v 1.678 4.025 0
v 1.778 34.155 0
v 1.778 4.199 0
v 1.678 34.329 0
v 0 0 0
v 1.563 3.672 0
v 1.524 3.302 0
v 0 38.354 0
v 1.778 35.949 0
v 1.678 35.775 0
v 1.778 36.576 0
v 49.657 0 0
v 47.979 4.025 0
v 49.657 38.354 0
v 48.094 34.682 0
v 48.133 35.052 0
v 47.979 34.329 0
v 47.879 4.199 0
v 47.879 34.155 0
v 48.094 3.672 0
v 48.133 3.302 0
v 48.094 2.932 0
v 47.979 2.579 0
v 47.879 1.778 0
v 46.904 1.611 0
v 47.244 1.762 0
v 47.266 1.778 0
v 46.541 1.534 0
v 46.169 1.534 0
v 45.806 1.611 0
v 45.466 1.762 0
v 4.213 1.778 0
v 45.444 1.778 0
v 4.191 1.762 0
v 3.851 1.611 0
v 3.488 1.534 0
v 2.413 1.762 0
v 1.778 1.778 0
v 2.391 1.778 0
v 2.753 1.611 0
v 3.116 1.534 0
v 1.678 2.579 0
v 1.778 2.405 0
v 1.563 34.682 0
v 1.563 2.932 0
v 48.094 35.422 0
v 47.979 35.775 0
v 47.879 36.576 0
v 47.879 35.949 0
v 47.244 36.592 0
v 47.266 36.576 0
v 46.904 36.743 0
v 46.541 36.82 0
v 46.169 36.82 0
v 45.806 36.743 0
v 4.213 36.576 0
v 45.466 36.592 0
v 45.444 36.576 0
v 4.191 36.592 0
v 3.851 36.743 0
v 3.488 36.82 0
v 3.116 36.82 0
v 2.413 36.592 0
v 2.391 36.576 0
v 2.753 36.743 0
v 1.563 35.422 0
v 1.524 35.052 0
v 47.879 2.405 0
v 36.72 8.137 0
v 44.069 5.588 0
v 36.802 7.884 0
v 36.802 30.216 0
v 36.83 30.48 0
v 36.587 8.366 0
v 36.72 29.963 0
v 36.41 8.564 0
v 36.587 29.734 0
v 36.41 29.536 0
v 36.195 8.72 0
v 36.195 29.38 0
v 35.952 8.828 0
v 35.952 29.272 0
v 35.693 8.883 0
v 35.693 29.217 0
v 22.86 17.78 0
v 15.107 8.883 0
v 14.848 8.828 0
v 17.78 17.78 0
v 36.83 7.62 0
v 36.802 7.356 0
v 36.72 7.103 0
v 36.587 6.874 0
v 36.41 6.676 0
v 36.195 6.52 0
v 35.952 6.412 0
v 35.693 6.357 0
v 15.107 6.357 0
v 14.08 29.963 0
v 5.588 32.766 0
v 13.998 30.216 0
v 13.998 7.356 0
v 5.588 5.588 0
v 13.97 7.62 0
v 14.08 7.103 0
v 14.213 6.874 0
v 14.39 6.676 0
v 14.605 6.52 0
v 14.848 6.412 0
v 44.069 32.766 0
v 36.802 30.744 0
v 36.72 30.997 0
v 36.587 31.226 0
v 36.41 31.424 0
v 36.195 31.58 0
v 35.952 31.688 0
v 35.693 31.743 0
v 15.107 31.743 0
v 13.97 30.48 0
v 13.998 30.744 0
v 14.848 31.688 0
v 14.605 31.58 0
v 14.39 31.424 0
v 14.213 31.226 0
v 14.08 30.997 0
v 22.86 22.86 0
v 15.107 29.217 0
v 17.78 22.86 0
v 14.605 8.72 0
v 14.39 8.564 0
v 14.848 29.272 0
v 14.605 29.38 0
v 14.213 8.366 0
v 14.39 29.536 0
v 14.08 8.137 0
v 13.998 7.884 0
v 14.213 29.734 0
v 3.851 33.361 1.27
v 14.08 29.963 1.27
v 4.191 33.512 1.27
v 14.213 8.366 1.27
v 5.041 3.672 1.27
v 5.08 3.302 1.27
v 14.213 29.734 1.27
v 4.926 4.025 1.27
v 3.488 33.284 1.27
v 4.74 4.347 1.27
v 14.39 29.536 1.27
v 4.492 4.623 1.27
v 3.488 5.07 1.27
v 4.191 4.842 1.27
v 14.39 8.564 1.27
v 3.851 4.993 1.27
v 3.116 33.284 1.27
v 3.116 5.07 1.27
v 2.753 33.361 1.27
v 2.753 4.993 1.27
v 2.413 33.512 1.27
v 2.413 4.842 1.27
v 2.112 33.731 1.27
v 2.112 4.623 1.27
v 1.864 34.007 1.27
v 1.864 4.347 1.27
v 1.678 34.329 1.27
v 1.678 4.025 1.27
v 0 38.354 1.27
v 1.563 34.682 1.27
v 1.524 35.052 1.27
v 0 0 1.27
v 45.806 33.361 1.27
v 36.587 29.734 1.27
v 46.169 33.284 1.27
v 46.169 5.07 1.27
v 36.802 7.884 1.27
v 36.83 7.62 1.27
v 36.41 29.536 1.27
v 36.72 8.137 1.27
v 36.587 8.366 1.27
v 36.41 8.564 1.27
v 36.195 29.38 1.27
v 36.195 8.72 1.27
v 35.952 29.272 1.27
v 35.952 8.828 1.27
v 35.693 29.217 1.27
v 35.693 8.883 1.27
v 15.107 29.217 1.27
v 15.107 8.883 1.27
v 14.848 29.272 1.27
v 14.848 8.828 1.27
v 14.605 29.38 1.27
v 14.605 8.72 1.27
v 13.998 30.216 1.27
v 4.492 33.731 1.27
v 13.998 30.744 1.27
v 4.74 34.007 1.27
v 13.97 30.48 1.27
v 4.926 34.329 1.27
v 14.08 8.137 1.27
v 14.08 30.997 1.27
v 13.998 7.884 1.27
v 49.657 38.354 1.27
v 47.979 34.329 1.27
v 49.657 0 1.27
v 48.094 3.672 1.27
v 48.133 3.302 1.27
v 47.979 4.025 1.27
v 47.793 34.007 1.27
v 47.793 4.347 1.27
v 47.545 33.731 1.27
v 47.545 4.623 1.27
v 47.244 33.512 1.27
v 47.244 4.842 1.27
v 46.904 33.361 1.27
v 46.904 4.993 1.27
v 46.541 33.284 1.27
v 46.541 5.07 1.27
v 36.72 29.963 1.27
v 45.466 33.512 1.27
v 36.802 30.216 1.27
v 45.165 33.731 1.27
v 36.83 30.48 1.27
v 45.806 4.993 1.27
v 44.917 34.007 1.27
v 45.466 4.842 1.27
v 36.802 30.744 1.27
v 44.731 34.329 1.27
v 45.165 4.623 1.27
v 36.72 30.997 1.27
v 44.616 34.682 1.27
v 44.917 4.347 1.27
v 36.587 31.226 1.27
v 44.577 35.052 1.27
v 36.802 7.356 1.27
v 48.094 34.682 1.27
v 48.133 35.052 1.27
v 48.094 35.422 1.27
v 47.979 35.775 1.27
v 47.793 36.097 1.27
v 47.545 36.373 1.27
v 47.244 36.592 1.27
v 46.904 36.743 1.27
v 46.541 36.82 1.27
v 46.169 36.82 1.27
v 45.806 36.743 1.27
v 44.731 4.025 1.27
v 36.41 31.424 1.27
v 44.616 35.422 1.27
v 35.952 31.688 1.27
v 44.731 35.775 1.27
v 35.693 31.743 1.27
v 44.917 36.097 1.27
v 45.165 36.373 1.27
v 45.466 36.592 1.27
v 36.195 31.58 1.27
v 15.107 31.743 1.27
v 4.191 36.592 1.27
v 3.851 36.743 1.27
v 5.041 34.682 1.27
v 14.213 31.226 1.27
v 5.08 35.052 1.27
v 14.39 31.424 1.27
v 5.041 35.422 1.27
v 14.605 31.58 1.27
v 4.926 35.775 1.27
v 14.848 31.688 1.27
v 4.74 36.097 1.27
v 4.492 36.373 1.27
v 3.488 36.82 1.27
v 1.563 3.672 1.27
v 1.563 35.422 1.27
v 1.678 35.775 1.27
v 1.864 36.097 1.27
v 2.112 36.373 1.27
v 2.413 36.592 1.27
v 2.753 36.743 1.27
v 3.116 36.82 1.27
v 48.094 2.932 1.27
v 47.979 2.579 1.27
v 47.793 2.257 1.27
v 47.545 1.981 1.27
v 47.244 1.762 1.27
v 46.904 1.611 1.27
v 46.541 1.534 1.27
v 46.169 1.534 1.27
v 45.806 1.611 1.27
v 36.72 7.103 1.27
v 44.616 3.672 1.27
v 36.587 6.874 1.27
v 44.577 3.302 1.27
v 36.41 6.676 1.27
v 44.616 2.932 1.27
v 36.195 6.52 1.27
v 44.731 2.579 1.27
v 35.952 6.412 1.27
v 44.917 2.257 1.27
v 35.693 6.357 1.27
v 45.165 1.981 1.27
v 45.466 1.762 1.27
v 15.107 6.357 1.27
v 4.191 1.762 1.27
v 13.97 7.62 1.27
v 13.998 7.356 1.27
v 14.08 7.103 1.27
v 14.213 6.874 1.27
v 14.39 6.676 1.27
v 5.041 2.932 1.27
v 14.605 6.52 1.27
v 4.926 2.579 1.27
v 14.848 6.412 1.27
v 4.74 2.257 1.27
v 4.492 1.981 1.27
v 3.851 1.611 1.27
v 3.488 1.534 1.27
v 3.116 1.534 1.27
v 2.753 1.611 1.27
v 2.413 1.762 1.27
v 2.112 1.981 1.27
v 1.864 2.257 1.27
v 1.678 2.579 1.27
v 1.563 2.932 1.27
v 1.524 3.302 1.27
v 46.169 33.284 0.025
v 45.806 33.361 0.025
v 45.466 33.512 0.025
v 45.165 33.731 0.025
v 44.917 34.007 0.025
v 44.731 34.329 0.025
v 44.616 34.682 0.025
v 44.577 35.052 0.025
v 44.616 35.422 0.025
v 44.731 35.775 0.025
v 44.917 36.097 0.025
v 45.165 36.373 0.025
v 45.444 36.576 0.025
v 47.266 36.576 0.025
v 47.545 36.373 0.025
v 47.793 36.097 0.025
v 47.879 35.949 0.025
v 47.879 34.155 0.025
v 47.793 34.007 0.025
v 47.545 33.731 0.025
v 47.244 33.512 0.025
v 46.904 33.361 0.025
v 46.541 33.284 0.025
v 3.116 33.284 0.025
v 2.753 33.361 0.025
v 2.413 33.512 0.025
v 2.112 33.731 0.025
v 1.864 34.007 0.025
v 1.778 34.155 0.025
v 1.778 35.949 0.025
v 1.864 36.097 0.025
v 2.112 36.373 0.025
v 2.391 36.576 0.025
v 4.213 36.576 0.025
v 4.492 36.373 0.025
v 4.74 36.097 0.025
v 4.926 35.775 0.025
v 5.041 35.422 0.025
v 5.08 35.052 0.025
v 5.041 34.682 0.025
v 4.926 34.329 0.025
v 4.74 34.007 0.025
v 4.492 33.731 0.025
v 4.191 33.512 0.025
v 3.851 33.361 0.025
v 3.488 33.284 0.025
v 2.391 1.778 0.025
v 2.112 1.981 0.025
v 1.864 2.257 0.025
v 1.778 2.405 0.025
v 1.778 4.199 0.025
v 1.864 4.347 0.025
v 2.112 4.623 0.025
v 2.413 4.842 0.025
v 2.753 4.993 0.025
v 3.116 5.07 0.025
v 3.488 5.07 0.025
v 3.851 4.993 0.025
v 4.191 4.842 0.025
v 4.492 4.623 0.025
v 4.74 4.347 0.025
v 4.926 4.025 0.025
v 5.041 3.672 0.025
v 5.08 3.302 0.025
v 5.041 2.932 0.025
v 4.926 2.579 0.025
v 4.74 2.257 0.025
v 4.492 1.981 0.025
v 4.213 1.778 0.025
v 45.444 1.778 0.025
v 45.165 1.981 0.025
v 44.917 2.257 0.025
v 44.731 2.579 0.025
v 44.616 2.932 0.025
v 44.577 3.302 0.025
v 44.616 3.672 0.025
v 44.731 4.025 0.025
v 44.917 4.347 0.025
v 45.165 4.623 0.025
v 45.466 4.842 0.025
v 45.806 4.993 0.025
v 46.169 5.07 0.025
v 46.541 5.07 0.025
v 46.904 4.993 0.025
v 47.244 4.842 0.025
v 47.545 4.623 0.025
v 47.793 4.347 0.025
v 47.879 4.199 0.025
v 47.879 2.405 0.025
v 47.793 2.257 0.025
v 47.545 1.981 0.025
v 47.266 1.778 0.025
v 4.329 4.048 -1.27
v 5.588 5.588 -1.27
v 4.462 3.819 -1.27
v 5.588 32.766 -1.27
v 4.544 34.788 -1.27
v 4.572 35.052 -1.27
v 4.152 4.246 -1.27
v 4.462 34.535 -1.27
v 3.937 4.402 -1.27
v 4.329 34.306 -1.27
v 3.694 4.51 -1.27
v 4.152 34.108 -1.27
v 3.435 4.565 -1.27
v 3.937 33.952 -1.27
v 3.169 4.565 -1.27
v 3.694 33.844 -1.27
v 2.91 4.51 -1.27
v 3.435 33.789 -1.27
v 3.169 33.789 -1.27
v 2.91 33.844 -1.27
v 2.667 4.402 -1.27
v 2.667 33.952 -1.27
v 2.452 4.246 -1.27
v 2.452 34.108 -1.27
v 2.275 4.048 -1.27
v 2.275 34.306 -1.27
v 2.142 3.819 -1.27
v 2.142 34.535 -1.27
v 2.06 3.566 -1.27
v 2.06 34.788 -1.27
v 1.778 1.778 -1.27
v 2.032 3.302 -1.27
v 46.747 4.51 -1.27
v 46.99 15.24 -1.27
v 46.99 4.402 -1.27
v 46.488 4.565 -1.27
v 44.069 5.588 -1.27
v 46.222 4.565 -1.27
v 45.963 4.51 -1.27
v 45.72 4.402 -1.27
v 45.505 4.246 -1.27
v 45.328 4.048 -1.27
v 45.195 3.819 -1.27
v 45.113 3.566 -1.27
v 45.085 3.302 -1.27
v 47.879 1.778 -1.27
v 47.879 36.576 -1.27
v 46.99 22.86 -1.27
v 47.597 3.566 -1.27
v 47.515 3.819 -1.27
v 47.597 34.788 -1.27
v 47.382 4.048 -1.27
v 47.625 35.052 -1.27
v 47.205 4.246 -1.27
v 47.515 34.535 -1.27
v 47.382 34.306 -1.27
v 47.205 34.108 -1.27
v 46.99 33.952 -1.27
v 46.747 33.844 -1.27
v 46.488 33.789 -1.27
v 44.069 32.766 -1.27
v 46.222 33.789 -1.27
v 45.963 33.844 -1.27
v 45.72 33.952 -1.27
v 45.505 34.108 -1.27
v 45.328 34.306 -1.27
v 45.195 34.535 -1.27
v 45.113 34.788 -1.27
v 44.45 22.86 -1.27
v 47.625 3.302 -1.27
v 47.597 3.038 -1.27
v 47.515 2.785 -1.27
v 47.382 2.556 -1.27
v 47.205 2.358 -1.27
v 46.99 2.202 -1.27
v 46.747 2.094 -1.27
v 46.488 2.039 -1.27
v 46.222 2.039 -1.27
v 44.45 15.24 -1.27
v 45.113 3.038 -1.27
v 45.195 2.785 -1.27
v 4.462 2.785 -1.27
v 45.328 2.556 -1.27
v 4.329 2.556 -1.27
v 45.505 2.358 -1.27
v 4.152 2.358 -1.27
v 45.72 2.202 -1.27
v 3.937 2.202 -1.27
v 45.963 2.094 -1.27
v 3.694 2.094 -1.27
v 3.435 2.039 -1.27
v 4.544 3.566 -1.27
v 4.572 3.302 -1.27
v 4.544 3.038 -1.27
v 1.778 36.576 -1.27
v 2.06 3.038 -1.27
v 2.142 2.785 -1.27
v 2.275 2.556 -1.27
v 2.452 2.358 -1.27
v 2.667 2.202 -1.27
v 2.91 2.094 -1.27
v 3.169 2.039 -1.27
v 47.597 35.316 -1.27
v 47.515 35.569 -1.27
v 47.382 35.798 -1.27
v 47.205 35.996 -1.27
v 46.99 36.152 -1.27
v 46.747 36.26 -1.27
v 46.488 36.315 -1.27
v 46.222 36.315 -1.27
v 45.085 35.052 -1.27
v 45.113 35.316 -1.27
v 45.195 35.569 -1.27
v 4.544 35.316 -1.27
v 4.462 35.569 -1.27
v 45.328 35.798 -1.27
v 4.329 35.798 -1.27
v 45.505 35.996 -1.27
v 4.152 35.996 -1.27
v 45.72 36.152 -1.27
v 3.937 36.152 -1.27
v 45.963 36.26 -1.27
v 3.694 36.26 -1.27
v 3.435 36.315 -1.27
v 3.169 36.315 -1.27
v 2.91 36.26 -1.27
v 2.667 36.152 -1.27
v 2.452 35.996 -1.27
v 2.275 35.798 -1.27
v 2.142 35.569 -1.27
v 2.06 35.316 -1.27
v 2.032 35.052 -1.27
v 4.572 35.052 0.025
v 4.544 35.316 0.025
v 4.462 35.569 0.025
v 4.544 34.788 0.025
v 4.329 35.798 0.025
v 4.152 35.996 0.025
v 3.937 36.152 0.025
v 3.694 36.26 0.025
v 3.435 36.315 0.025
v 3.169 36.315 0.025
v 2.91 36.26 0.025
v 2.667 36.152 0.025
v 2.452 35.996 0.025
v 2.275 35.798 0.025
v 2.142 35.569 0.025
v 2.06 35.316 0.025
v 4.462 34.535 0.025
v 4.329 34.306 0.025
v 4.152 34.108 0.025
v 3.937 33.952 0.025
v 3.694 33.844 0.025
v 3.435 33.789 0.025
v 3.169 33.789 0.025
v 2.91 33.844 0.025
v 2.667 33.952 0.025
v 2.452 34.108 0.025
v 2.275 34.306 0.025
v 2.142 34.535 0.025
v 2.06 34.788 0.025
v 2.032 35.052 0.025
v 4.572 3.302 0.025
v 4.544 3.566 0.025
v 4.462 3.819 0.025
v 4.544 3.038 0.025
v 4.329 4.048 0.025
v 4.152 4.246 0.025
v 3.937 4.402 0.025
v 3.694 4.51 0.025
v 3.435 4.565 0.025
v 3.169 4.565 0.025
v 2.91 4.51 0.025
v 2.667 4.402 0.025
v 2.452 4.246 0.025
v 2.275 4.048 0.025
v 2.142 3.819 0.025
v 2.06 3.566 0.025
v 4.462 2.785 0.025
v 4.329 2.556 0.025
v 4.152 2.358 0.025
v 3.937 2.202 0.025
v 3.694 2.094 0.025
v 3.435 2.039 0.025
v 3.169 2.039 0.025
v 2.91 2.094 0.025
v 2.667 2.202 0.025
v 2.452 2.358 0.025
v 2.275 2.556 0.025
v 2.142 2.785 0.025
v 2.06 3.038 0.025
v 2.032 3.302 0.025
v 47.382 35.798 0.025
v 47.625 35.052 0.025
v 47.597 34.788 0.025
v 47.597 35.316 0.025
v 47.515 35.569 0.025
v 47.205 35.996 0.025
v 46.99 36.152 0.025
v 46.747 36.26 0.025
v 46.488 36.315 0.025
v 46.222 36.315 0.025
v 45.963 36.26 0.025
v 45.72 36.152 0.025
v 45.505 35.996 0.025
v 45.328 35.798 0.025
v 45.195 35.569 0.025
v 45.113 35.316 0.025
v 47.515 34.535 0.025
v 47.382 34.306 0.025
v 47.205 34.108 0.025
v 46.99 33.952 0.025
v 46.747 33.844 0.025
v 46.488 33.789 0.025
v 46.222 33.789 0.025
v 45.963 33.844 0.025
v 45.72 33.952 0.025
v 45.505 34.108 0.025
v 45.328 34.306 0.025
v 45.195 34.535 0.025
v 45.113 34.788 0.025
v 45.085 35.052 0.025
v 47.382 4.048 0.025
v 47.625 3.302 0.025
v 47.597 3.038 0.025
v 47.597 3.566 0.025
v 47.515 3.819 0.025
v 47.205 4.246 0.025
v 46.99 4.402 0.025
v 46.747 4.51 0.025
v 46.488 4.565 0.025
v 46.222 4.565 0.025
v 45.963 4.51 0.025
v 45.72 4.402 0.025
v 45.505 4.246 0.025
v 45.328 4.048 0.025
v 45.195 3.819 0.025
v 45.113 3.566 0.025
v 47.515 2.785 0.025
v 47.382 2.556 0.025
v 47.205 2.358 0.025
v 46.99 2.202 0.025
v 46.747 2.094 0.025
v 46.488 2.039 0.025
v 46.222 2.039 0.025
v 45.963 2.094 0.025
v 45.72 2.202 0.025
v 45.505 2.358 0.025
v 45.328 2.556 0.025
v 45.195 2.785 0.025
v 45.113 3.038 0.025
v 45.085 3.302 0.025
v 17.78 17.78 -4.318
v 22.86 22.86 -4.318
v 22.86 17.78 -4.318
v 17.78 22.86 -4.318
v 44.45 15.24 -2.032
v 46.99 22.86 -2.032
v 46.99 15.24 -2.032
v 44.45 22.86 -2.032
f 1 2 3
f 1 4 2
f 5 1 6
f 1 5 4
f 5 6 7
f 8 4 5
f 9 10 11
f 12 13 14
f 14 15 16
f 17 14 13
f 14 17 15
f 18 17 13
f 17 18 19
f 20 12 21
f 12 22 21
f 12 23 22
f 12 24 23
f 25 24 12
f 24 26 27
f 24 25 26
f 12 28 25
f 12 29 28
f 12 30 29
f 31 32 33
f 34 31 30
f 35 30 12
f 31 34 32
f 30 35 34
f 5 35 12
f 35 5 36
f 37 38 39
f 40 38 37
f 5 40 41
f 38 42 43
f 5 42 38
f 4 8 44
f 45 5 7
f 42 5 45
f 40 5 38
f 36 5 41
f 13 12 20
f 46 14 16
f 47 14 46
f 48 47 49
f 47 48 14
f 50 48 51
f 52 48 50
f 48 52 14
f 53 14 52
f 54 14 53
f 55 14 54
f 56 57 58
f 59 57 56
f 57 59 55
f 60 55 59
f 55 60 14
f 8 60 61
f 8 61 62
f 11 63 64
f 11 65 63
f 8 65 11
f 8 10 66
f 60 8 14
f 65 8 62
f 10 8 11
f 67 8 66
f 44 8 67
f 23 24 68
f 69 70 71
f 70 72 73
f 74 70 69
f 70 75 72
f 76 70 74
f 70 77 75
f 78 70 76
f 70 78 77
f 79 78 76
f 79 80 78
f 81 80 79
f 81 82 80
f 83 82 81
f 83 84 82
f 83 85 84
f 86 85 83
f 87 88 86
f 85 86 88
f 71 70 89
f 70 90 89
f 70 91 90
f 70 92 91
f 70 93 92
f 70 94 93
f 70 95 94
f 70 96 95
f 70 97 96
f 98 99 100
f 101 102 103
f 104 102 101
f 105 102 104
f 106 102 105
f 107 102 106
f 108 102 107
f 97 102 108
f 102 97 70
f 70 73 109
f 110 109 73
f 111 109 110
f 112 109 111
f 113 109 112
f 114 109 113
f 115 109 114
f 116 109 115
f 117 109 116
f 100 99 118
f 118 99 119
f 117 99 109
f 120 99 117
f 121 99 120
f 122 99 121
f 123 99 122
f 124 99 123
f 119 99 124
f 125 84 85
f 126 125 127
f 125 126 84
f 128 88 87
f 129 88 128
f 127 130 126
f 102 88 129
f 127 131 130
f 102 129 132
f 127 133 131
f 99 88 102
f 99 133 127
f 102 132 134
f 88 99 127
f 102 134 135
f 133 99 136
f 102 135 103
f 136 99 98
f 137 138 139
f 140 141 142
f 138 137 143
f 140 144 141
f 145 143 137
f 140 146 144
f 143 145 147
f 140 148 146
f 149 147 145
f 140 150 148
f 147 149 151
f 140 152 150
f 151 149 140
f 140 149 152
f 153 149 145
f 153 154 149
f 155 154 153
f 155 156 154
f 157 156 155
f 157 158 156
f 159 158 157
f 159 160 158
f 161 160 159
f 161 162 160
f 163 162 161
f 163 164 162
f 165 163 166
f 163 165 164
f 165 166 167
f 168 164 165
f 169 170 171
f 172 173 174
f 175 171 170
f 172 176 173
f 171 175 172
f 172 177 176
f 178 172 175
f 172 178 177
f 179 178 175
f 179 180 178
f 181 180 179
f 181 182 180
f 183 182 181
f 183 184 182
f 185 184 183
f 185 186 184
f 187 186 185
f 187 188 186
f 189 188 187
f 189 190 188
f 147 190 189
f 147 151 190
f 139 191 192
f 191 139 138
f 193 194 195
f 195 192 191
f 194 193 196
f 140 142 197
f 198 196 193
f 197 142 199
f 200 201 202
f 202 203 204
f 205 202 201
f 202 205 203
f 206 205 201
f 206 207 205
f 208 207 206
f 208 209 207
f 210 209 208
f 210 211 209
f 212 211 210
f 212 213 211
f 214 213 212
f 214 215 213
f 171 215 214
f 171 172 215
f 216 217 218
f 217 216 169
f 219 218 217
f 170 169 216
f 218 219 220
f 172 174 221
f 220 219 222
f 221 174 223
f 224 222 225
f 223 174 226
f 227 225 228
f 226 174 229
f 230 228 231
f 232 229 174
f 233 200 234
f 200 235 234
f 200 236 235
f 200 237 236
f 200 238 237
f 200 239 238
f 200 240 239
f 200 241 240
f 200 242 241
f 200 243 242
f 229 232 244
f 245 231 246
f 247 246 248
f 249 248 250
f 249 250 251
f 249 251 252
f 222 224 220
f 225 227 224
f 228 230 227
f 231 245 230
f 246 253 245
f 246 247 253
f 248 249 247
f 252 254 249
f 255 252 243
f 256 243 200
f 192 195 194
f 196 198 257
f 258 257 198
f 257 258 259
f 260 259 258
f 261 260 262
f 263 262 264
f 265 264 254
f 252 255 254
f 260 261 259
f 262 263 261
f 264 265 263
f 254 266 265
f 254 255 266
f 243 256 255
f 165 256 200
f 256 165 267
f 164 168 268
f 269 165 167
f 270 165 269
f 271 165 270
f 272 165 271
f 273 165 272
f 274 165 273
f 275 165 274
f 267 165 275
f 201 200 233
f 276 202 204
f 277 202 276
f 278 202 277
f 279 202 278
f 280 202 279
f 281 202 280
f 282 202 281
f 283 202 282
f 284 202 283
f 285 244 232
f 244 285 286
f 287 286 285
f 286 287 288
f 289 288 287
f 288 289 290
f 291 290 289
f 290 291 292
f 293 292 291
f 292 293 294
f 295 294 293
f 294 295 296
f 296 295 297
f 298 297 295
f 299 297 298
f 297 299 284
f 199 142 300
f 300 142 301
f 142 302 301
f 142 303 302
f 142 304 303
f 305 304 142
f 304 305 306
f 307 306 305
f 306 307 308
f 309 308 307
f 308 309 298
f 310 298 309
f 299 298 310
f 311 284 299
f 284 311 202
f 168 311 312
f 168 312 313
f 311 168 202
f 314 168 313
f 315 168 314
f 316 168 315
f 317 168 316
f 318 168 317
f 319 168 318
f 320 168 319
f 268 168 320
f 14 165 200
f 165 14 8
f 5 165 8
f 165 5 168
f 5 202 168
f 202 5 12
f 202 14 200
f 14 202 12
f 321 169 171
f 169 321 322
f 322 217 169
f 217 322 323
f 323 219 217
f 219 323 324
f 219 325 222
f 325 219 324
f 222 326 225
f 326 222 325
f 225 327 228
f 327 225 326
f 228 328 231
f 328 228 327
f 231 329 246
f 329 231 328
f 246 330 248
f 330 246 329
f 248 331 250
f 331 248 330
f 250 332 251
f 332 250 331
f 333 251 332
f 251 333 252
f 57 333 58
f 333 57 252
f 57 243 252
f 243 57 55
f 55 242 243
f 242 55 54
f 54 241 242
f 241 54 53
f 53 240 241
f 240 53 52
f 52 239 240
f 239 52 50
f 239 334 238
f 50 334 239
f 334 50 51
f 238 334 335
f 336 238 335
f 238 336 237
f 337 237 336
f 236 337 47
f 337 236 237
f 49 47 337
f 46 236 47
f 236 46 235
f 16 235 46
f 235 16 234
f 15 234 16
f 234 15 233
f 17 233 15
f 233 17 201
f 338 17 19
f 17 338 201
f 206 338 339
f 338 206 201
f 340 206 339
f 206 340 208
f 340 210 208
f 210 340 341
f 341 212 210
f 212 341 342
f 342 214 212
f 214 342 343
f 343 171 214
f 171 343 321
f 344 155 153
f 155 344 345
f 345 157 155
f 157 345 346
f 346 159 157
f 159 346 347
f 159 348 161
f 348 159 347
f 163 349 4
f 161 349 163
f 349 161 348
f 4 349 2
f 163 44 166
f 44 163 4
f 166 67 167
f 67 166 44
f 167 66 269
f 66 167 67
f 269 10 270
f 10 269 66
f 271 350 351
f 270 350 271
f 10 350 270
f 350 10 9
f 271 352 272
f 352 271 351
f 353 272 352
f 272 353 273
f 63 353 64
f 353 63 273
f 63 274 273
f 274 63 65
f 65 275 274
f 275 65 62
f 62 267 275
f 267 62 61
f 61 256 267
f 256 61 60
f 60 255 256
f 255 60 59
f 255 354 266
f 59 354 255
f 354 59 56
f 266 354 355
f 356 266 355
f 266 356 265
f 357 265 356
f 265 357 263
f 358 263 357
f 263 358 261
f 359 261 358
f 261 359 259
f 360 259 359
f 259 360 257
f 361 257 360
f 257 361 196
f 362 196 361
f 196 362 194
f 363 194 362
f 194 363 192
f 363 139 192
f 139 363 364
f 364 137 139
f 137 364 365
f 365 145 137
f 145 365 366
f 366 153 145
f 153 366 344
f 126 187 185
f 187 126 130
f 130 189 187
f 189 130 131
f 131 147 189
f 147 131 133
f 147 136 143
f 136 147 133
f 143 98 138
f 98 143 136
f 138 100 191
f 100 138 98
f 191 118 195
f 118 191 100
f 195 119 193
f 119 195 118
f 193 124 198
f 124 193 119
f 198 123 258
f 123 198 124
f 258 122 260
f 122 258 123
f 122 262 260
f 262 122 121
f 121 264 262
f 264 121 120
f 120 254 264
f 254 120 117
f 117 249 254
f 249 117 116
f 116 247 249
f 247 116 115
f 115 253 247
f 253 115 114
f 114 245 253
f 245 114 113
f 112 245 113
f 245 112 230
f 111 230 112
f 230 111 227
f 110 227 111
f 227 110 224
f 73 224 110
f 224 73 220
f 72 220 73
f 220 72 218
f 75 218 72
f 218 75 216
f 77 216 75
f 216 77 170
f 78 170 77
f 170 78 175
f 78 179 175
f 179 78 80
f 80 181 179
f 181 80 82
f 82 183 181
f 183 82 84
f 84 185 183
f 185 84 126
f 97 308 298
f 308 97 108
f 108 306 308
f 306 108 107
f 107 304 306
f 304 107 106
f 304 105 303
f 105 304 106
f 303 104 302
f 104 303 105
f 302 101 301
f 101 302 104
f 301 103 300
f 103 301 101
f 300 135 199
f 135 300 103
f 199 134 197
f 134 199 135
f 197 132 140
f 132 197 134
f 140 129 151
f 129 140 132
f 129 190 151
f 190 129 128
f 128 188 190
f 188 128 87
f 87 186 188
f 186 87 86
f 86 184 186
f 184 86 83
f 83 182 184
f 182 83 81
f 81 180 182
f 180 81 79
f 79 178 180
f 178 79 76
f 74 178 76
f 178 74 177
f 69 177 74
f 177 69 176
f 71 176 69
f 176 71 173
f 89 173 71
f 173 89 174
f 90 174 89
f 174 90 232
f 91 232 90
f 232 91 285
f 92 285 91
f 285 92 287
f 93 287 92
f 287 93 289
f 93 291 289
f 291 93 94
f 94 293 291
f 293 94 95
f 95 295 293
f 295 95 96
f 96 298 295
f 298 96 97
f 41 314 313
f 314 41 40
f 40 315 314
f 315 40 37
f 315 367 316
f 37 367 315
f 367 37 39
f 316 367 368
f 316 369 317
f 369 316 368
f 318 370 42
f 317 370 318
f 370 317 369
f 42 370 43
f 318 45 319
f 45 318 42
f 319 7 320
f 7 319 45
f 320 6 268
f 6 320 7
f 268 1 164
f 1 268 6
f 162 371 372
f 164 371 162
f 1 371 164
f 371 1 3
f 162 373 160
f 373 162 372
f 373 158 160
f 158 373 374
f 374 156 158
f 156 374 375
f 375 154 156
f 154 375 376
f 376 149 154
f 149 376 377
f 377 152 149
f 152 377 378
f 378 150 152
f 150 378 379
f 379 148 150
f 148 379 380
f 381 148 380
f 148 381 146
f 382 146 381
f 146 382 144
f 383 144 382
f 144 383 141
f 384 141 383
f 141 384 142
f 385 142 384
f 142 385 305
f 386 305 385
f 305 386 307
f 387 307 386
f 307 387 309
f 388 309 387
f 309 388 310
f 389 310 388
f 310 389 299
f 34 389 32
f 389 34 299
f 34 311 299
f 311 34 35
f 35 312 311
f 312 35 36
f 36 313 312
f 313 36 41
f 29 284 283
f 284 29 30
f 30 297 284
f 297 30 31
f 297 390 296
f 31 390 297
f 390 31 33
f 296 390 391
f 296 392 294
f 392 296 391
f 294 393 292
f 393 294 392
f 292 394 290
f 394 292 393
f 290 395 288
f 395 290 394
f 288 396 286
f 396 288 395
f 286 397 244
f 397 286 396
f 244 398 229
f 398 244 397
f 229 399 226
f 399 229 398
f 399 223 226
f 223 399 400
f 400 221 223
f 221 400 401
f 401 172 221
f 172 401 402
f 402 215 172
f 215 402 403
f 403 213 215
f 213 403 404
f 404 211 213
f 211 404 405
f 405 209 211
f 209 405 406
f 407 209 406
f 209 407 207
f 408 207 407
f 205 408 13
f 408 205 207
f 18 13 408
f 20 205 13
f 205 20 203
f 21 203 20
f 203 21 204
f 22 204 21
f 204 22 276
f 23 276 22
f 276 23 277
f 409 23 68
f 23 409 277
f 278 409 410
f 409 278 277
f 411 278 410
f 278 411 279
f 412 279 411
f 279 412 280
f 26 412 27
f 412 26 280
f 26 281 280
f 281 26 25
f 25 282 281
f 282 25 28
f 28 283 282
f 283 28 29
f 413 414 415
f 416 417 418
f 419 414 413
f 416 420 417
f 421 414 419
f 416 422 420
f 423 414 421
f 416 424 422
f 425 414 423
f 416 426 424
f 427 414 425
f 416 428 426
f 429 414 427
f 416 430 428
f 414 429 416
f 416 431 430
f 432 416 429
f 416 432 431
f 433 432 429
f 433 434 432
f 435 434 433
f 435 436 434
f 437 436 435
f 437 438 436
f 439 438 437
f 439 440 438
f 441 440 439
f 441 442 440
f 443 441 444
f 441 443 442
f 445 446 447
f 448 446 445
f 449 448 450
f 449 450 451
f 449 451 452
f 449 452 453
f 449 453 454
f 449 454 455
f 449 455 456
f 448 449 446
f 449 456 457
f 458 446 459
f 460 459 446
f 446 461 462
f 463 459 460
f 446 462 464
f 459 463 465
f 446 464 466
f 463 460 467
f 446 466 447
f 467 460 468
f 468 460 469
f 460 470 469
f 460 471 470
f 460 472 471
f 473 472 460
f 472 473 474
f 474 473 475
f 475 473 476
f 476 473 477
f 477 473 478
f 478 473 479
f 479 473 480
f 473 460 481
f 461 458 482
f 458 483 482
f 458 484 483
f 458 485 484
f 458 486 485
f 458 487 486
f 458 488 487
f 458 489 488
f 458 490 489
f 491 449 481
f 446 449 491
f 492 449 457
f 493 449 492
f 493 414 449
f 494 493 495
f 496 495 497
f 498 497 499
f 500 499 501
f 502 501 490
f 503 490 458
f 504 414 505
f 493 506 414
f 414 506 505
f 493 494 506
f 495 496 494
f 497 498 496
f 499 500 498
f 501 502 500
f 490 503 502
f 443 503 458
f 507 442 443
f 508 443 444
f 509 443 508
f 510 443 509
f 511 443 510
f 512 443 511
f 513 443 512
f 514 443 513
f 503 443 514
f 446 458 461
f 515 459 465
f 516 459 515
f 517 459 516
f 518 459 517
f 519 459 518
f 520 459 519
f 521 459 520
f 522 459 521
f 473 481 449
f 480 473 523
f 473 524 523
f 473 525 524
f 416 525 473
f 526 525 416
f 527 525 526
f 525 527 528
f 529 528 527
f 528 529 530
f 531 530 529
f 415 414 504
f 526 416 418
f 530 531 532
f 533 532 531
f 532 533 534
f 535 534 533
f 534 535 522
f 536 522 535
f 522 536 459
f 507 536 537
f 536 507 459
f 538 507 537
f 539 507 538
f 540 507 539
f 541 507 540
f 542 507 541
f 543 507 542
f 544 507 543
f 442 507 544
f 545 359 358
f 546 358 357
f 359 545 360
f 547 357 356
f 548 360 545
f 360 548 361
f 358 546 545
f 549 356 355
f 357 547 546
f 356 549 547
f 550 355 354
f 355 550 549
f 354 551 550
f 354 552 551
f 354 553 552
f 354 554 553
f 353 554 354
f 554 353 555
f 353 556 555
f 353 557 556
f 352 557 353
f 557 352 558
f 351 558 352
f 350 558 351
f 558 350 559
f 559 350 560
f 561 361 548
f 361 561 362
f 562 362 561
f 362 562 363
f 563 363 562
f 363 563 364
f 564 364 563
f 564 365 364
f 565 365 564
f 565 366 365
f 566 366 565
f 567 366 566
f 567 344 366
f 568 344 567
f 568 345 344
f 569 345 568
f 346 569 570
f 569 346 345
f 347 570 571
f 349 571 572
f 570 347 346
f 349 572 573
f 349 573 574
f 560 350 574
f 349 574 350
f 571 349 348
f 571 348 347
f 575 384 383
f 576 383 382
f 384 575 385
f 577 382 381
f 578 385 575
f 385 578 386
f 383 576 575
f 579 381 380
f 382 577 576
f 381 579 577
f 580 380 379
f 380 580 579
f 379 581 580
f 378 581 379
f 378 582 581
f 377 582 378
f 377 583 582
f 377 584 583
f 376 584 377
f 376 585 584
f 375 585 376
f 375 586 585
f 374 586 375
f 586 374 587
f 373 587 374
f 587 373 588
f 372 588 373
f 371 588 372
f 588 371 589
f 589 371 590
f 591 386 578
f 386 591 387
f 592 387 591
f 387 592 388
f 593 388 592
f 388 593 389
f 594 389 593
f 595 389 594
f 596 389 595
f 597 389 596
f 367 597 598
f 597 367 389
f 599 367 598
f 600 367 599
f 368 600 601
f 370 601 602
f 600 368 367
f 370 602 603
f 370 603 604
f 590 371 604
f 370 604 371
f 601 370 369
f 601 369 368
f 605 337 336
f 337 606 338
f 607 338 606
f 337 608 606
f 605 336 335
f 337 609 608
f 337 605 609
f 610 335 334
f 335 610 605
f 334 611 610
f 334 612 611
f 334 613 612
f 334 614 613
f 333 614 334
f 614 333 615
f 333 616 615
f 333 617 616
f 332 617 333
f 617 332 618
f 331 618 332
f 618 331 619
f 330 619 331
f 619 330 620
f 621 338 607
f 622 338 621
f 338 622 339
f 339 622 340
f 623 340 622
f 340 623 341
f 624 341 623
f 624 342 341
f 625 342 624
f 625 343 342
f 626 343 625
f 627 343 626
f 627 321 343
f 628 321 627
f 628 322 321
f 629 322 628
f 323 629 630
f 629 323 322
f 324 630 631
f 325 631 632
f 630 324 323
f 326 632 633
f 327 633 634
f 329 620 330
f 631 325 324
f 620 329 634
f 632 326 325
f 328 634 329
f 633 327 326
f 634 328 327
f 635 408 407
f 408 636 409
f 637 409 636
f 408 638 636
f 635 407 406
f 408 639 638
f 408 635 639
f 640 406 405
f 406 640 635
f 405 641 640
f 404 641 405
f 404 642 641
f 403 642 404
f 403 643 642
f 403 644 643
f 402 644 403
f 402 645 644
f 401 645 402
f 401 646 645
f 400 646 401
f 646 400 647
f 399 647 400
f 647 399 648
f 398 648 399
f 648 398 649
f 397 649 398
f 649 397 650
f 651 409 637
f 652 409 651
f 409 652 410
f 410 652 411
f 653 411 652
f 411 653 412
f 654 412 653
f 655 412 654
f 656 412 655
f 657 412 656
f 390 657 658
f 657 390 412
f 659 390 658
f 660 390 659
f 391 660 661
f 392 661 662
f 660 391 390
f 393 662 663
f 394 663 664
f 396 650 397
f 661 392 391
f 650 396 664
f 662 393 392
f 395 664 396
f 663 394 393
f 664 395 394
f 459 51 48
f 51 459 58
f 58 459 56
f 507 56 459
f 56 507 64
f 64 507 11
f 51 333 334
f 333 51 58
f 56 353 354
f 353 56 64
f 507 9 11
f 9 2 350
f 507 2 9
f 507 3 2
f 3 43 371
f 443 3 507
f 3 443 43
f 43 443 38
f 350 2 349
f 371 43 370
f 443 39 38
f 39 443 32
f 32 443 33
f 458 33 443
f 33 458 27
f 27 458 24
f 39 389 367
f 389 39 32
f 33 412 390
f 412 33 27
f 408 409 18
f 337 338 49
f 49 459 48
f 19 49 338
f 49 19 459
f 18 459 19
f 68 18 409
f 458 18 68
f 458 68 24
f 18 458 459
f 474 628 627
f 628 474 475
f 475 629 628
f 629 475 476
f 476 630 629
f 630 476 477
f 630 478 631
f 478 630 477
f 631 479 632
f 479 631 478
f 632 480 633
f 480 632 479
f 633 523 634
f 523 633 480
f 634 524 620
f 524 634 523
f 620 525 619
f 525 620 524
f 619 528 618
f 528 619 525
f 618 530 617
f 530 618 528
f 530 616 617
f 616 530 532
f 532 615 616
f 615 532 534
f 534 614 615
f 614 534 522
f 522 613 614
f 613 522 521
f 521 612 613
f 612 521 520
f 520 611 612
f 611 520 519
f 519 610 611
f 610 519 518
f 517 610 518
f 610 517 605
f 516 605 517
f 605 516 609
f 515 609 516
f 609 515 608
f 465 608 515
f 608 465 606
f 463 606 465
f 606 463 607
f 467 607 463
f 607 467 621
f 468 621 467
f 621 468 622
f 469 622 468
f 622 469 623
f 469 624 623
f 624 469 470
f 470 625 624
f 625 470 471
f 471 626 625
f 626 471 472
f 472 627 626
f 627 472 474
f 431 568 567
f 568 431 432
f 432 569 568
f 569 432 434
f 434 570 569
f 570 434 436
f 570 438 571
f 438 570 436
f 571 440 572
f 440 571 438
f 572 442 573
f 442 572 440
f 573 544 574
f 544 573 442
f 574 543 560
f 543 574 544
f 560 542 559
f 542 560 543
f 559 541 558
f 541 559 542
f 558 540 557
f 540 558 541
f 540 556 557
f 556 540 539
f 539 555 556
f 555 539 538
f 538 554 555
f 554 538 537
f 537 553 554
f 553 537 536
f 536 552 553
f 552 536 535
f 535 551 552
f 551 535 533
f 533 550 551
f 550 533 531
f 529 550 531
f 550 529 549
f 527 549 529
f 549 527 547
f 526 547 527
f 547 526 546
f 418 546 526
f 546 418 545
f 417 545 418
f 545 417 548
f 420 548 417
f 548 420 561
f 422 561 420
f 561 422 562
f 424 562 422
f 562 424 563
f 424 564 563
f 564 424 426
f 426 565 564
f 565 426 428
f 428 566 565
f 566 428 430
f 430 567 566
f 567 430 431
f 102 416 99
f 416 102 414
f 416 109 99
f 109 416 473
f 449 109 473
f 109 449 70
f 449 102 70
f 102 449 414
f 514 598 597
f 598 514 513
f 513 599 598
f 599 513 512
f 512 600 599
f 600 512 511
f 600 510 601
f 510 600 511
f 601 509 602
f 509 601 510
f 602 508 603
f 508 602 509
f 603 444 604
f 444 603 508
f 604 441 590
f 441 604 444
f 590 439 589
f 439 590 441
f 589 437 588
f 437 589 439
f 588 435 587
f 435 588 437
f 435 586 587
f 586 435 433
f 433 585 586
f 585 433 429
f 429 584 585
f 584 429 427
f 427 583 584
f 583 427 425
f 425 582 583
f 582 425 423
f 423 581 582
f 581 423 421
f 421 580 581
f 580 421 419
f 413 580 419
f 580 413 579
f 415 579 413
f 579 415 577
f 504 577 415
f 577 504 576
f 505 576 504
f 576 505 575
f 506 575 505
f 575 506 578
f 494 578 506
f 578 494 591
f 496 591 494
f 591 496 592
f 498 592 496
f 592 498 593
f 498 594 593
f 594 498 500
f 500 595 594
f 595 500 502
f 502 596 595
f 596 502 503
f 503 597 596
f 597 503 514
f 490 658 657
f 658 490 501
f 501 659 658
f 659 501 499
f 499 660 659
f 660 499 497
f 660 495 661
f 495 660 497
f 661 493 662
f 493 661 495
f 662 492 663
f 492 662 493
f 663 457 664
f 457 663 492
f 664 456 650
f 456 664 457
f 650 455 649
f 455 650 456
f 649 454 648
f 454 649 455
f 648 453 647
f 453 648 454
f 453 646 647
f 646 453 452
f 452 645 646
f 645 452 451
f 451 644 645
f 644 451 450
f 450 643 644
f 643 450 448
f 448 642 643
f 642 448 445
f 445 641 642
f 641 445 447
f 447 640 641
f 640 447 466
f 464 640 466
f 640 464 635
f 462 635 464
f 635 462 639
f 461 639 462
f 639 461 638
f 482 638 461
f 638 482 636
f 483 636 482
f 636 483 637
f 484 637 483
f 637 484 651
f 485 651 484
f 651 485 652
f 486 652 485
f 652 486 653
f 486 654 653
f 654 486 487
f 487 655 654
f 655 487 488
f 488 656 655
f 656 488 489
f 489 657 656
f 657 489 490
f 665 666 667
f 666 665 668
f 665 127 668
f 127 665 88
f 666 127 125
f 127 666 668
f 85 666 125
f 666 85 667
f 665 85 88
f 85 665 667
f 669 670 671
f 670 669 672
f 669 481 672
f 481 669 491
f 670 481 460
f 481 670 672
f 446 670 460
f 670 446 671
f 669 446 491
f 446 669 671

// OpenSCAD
// file: ../models/esp8266_d1_min.scad
module model_esp9266_d1_min()
{
    pcbWidth = 1355;
    pcbHeight = 1010;
    color("CornflowerBlue")
    // Main PCB
    linear_extrude(50)
    square([pcbWidth, pcbHeight], center=true);

    // ESP 8266 Carrier
    color("SteelBlue")
    translate([-pcbWidth/2+947/2, 0, 49])
    linear_extrude(36)
    square([947, 630], center=true);

    // ESP8266 Module
    color("SkyBlue")
    translate([-pcbWidth/2+590/2+290, 0, 84])
    linear_extrude(100)
    square([590, 470], center=true);

    // USB Connector under board
    color("SteelBlue")
    translate([pcbWidth/2-220/2, -30, -110])
    linear_extrude(111)
    square([220, 320], center=true);

    // Reset button under board
    color("SteelBlue")
    translate([pcbWidth/2-192/2-50, pcbHeight/2-130/2, -90])
    linear_extrude(91)
    square([192, 130], center=true);

    // USB Serial chip under board
    color("SteelBlue")
    translate([pcbWidth/2-240/2-350, pcbHeight/2-390/2-350, -60])
    linear_extrude(61)
    square([240, 390], center=true);
}
// main file
ViewScale = [0.0254, 0.0254, 0.0254];
include <../models/esp8266_d1_min.scad>

modelcolor=1;
models=1;

pcbWidth = 1355;
pcbHeight = 1010;

module holder()
{
    linear_extrude(50)
    difference() {
        square([pcbWidth+600, pcbHeight+500]);
        translate([600, 300, 0])
        hull() {
            circle(100/2);
            translate([0, 800, 0])
            circle(100/2);
        }
//        translate([190, 90, 0])
//        square([pcbWidth-480, pcbHeight-40]);
    }

    // Wire cutout
    translate([0, 0, 49])
    linear_extrude(151)
    difference() {
        square([pcbWidth+600, pcbHeight+500]);
        translate([50, 50, 0])
        square([pcbWidth+500, pcbHeight+400]);
        translate([0, pcbHeight/2-150, 0])
        square([100, 200]);
    }

    // USB Cutout
    translate([0, 0, 199])
    linear_extrude(250)
    difference() {
        square([pcbWidth+600, pcbHeight+500]);
        translate([50, 50, 0])
        square([pcbWidth+500, pcbHeight+400]);
        translate([1900, pcbHeight/2+60, 0])
        square([100, 450]);
    }

    // Screw mounts
    translate([130, 130, 49]) linear_extrude(300) difference() { circle(180/2); circle(80/2); }
    translate([1825, 130, 49]) linear_extrude(300) difference() { circle(180/2); circle(80/2); }
    translate([1825, 1380, 49]) linear_extrude(300) difference() { circle(180/2); circle(80/2); }
    translate([130, 1380, 49]) linear_extrude(300) difference() { circle(180/2); circle(80/2); }

    // ESP Backstop
    translate([400,400,49])
    linear_extrude(250)
    square([100, 800]);

    // Module rails
    translate([850, 400, 49])
    linear_extrude(101)
    square([500, 100]);
    translate([850, 1000, 49])
    linear_extrude(101)
    square([500, 100]);

    *translate([0, 0, 49]) {
        linear_extrude(251)
        square([pcbWidth+240, 50]);
        linear_extrude(251)
        translate([0, pcbHeight+90, 0])
        square([pcbWidth+240, 50]);
    }

    // Right Wall
    // Front
    *translate([0, 0, 409])
    linear_extrude(50)
    square([pcbWidth+240, pcbHeight+140]);

    // Bottom
    *translate([pcbWidth+190, 0, 49])
    linear_extrude(311)
    square([50, pcbHeight+140]);

    // Screw mounts
    *translate([250, pcbHeight+140+500/2-1, 0])
    linear_extrude(100)
    difference() {
        hull() {
            circle(500/2);
            translate([-250, -300, 0])
            square([500, 300]);
        }
        circle(180/2);
    }
    // Screw mount
    *translate([250, -500/2+1, 0])
    linear_extrude(100)
    difference() {
        hull() {
            circle(500/2);
            translate([-250, 300, 0])
            square([500, 300]);
        }
        circle(180/2);
    }


//    difference() {
//
//        square([pcbWidth+120, pcbHeight+140]);
//        translate([0, pcbHeight/2-550/2, 0])
//        square([pcbWidth+120, 550]);
//    }
}

module lid()
{
    linear_extrude(50)
    difference() {
        square([pcbWidth+600, pcbHeight+500]);
        for(ii=[300, 1200]) {
        translate([600, ii, 0])
            hull() {
                circle(100/2);
                translate([800, 0, 0])
                circle(100/2);
            }
        }
        translate([130, 130, 49]) circle(140/2);
        translate([1825, 130, 49]) circle(140/2); 
        translate([1825, 1380, 49]) circle(140/2);
        translate([130, 1380, 49])  circle(140/2);
    }

    // Inner
    translate([70, 70, -50])
    linear_extrude(51)
    difference() {
        square([pcbWidth+460, pcbHeight+360]);
        translate([150, 150, 0])
        square([pcbWidth+160, pcbHeight+60]);
        translate([60, 60, 49]) circle(100/2);
        translate([1755, 60, 49]) circle(100/2); 
        translate([1755, 1310, 49]) circle(100/2);
        translate([60, 1310, 49])  circle(100/2);
    }

    // ESP Support
    translate([700, 700, -170])
    linear_extrude(171)
    square([200, 200]);

    // USB Support
    translate([1750, 600, -80])
    linear_extrude(81)
    square([100, 300]);

}

module forViewing()
{
    translate([pcbWidth/2+530, (pcbHeight/2)+240, 250])
    rotate([180, 0, 0])
     model_esp9266_d1_min();
     holder();
     translate([0, 0, 450])
     lid();
}

module forPrinting()
{
//     holder();
    lid();
}

scale(ViewScale)
{
    //forViewing();
    forPrinting();
}
